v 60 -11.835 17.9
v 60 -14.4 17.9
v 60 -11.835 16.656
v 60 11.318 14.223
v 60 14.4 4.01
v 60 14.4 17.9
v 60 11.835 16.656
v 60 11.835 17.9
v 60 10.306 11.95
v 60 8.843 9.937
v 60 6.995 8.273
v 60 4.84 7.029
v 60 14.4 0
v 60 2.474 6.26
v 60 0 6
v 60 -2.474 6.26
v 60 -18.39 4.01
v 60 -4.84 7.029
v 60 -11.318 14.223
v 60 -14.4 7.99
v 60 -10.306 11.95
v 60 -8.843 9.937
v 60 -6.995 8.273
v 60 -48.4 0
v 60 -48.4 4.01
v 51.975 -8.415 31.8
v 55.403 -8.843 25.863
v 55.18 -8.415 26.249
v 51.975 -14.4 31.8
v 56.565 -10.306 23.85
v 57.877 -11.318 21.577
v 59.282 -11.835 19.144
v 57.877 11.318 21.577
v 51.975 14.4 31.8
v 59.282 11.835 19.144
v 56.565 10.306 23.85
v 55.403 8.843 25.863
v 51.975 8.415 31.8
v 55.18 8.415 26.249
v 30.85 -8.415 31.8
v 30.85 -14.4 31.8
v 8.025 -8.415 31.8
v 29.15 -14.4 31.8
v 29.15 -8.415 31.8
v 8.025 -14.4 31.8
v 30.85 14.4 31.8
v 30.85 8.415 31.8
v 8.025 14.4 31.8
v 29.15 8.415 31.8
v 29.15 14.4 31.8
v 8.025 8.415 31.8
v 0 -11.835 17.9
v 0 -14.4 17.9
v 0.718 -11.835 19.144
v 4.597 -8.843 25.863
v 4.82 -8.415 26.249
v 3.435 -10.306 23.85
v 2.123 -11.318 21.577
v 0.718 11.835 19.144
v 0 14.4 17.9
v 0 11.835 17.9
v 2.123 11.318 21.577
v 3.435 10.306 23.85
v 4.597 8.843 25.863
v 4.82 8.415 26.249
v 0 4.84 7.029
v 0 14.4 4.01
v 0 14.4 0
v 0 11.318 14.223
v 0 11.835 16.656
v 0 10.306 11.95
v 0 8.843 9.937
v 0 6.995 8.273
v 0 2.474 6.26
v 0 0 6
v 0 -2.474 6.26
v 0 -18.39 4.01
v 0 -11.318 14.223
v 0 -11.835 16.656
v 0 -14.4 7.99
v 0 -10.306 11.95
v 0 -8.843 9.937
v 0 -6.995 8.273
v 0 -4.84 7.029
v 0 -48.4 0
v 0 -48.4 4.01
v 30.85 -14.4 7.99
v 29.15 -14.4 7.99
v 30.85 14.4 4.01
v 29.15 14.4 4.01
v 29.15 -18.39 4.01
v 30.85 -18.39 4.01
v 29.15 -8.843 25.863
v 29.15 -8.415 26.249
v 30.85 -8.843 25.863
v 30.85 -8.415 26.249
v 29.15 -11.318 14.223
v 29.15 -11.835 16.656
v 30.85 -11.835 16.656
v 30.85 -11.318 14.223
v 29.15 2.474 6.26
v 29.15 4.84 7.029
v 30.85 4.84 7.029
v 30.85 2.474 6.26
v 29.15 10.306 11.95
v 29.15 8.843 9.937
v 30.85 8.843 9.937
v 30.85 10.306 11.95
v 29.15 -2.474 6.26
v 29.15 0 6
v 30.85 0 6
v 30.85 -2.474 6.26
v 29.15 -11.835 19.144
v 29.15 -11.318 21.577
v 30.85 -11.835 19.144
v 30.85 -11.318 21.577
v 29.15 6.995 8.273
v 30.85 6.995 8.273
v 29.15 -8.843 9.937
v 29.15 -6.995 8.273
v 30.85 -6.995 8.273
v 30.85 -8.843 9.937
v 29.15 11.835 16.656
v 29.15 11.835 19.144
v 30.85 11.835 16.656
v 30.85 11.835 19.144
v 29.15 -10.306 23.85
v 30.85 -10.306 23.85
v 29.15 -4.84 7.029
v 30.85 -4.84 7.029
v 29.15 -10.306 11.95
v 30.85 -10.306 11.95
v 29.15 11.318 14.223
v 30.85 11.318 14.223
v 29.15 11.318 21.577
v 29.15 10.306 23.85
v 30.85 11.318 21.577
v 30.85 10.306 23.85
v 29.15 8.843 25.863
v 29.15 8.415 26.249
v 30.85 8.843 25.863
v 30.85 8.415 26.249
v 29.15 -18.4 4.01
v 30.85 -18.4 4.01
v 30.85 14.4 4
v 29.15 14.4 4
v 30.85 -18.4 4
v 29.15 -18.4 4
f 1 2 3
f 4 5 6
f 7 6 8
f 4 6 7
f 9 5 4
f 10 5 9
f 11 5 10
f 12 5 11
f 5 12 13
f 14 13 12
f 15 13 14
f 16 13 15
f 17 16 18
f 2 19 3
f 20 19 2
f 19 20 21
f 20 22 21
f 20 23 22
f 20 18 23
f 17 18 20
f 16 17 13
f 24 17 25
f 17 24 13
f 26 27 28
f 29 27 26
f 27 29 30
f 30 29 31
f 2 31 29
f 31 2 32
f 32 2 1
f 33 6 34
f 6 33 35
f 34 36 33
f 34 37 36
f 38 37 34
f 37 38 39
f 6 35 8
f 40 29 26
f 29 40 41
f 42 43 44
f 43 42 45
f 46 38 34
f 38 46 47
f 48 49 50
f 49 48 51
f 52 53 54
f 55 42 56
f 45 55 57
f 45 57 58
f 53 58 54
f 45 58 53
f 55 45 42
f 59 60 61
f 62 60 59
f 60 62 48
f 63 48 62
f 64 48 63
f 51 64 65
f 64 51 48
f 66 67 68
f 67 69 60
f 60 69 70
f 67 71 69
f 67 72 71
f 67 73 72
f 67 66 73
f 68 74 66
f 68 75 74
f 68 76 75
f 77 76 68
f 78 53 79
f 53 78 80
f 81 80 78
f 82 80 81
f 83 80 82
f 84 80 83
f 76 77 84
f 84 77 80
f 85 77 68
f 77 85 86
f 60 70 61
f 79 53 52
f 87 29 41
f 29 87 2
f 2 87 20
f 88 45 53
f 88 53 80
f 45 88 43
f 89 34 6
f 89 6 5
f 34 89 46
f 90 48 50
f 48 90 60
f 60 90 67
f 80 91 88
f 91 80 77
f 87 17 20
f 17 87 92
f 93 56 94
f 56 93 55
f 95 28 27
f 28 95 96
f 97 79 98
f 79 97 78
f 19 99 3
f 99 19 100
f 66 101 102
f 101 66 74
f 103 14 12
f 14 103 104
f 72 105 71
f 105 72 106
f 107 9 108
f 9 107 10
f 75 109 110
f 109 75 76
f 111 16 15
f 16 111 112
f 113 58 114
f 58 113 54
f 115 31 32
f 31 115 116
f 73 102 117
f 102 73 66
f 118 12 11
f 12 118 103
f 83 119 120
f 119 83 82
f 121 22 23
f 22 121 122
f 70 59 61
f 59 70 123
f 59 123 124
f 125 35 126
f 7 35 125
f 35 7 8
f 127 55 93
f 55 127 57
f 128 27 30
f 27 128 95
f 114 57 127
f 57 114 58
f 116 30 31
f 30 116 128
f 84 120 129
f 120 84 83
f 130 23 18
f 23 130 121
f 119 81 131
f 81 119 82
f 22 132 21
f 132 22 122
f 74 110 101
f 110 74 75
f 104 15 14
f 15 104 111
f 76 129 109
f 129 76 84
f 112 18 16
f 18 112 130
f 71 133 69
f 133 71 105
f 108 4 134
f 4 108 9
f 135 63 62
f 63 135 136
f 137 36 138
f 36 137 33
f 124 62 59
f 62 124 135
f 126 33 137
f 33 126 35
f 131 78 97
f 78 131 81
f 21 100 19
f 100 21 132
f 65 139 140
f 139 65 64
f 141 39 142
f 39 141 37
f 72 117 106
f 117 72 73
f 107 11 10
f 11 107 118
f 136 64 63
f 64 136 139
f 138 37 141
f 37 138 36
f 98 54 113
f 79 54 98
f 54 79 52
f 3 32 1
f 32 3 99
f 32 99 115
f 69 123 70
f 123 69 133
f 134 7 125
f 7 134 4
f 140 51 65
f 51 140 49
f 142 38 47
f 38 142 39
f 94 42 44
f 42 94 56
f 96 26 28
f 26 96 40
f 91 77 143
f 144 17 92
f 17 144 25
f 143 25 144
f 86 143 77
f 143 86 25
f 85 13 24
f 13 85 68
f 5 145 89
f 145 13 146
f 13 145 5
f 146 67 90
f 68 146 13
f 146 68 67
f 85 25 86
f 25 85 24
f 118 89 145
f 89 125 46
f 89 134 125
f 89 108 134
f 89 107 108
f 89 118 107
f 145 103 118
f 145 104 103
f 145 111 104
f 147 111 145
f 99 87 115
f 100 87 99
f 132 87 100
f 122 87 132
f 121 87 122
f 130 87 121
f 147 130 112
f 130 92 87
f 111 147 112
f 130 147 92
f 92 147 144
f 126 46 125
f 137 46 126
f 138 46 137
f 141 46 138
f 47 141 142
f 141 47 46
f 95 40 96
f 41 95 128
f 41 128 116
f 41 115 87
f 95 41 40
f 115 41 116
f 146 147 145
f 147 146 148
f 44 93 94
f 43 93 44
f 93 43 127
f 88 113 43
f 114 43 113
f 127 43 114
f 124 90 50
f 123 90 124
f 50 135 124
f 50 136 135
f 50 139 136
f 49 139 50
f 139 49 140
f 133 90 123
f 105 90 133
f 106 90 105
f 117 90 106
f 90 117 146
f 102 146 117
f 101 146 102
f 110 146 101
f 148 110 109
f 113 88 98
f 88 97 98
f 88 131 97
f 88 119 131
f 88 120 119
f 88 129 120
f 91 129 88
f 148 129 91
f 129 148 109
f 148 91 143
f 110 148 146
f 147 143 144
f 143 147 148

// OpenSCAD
use <tubemesh.scad>;

//<params>
baseThickness = 4;
length = 60;
kerf = 1.6;
tubingDiameter = 23.5;
clampingWidth = 30;
minWall = 2.5;
tubingTolerance = 0.15;
kerfTolerance = 0.1;
endAngle = 30;
stopWall = 2;
cornerSize = 4;
extraCutHeight = 2;
part = 0; // [0:miter,1:end stop]
//</params>

module dummy() {}

nudge = 0.01;
length1 = part==0 ? length : length/2;
kerf1 = kerf+kerfTolerance;
tubingDiameter1 = tubingDiameter + 2 * tubingTolerance;
tubingMax = tubingDiameter1 + 2*minWall;
clampingWidth1 = clampingWidth + cornerSize;
tubeCutHeight = tubingDiameter1 + extraCutHeight; 
module solid() {
    cornerTri = [[nudge,0],[-cornerSize,0],[nudge,cornerSize]];
    sideProfile = [[0,0],[length1,0],[length1,extraCutHeight+tubingDiameter1/2],[length1-((part==0)?(tubeCutHeight-tubingDiameter1/2)*tan(endAngle):0),extraCutHeight+tubeCutHeight],[(tubeCutHeight-tubingDiameter1/2)*tan(endAngle),extraCutHeight+tubeCutHeight],[0,extraCutHeight+tubingDiameter1/2]];
    translate([0,-clampingWidth1-tubingMax/2,0]) cube([length1,tubingMax+clampingWidth1,baseThickness+nudge]);
    translate([0,-tubingMax/2,baseThickness]) 
    difference() {
        union() {
            tubeMesh([sectionY(sideProfile,0),sectionY(sideProfile,tubingMax)]);
            tubeMesh([sectionX(cornerTri,0),sectionX(cornerTri,length1)]);
        }
        translate([-nudge,tubingMax/2,tubingDiameter1/2+extraCutHeight]) rotate([0,90,0]) cylinder(d=tubingDiameter1,h=length1+2*nudge);
        translate([-nudge,tubingMax/2-tubingDiameter1*cos(45)/2,tubingDiameter1/2]) cube([length1+2*nudge,tubingDiameter1*cos(45),tubeCutHeight]);
     
    }
}

render(convexity=2)
if (part==0) {
    difference() {
        solid();
        translate([length1/2-kerf1/2,-tubingMax/2-cornerSize ,baseThickness]) cube([kerf1,tubingMax+cornerSize+nudge,extraCutHeight+tubingMax+nudge]);
    }
}
else if (part==1) {
    solid();
    translate([length1-stopWall,-tubingMax/2,0]) cube([stopWall,tubingMax,extraCutHeight+tubeCutHeight+baseThickness+nudge]);
}
